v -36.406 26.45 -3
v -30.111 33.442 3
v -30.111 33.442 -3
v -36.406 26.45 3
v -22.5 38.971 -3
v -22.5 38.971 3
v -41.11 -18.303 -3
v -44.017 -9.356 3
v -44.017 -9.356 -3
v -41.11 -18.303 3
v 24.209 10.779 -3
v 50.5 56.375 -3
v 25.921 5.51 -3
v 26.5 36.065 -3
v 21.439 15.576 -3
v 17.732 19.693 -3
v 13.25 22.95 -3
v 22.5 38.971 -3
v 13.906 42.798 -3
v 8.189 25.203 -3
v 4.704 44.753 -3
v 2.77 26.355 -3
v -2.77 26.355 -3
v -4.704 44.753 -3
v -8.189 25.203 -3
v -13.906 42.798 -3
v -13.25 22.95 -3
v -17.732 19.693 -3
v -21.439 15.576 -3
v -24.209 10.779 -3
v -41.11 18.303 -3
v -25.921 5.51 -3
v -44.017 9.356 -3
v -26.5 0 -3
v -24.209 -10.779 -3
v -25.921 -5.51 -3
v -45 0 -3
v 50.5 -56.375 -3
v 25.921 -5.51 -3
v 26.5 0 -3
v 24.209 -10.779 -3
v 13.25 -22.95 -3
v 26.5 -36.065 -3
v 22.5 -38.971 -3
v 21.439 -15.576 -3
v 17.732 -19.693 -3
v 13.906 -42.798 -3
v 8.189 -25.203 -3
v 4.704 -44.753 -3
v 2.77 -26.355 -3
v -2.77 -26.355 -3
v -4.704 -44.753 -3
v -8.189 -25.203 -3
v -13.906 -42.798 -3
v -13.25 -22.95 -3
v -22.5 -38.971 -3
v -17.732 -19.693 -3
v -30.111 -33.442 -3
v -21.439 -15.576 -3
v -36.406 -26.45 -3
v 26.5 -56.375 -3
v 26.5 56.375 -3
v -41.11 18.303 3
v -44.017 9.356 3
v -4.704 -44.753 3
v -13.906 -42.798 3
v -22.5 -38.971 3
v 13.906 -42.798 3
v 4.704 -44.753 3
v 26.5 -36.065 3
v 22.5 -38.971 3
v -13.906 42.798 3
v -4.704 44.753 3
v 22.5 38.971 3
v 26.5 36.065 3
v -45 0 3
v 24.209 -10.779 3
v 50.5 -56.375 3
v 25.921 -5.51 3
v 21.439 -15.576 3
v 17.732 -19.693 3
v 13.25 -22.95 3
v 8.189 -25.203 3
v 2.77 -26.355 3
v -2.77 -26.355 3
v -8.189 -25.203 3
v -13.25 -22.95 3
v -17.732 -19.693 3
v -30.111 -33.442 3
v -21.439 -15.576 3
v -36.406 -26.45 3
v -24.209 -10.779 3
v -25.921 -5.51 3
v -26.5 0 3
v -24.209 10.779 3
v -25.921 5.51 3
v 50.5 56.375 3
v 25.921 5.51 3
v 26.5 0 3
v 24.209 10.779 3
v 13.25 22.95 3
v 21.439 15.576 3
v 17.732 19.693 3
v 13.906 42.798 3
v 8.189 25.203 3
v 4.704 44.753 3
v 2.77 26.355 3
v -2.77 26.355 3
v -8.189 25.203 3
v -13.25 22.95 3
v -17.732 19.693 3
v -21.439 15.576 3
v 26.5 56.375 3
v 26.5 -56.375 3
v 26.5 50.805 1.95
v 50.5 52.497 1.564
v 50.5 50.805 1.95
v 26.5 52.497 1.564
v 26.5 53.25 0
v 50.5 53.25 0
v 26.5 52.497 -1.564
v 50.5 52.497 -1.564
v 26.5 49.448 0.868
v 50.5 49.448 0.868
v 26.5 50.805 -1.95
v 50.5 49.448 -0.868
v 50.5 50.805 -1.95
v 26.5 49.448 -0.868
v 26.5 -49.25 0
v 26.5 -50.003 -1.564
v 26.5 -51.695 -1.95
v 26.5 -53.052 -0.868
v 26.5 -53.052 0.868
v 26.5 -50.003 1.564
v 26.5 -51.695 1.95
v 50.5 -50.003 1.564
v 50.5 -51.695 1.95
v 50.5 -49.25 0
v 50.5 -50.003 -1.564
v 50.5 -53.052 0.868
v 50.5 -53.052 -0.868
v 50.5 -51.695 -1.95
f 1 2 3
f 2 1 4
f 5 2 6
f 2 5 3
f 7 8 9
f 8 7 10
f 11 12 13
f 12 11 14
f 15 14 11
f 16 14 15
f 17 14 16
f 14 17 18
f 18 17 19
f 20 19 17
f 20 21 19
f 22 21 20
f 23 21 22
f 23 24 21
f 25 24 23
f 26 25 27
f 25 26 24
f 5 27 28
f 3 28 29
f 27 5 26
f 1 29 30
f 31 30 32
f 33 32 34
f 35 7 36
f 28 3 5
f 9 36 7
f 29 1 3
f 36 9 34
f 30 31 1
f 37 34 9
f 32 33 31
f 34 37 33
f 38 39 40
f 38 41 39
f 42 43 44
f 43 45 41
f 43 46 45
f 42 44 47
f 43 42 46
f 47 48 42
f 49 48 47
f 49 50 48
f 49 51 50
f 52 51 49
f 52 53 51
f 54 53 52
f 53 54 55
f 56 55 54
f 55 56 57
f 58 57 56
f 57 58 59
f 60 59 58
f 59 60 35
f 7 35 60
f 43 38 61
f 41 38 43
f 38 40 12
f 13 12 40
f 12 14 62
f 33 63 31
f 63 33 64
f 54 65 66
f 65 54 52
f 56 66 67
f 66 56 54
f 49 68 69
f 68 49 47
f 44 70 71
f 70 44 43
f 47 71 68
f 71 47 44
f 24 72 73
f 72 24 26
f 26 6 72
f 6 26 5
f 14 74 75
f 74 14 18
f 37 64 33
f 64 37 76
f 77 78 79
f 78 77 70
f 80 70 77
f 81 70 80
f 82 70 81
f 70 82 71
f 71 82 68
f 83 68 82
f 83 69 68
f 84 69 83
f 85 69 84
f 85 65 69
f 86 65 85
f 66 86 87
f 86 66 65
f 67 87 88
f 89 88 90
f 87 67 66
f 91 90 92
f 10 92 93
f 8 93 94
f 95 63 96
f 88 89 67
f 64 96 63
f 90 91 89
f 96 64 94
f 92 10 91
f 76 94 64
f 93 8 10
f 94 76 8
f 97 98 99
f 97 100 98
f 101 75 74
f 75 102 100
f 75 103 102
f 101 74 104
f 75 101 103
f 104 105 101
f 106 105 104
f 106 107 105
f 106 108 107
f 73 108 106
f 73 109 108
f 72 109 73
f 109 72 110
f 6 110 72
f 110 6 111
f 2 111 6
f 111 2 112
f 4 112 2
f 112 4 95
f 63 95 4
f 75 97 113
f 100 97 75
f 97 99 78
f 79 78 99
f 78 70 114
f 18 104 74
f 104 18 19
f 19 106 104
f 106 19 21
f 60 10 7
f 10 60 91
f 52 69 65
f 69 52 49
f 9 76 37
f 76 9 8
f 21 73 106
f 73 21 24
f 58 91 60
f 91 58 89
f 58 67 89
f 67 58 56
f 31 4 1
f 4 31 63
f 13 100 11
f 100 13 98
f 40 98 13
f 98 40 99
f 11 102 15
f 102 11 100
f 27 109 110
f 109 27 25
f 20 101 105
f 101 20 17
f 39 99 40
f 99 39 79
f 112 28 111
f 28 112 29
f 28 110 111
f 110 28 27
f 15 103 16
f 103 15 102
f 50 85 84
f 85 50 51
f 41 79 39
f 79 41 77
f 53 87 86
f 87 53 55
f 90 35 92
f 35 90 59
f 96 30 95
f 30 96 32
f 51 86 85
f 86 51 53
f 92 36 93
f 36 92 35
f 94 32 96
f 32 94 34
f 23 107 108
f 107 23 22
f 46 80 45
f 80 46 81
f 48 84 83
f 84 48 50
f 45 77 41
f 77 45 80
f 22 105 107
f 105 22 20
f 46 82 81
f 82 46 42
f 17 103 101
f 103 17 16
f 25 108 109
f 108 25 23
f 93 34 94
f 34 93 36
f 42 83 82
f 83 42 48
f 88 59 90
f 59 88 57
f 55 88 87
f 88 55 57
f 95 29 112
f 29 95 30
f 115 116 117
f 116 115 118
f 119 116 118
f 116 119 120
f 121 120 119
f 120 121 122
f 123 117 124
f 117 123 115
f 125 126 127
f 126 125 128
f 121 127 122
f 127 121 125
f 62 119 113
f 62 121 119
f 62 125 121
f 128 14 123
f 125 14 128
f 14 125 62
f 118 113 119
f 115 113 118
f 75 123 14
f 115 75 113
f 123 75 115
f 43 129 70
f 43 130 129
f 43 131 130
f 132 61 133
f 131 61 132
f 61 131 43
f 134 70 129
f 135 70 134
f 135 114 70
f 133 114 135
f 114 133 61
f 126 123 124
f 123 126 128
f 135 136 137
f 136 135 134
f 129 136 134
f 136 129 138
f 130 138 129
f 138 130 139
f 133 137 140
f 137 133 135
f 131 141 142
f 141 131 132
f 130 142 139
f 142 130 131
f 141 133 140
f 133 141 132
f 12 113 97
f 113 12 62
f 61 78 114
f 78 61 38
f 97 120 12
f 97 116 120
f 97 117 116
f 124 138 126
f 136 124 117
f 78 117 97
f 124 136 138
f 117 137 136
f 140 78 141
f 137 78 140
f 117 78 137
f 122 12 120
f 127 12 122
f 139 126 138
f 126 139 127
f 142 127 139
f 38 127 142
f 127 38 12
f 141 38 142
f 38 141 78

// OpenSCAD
// base params
mounting_hole_spacing = 102.5;
mounting_hole_radius = 2;

// dependent params: copied from tower grommet dimensions. sync manually
passthrough_height = 89;
passthrough_radius_outer = 25.5;
wall_thickness = 2.5;
flare_radius = 12.5;
flare_thickness = 3;
fit_gap = 1;
passthrough_radius_inner = passthrough_radius_outer - wall_thickness - fit_gap/2;

// computed params
bracket_width = mounting_hole_spacing * 1.1;
slip_ring_thickness = flare_thickness * 2;
bracket_depth = slip_ring_thickness;
bracket_height = bracket_depth * 4;
slip_ring_radius_outer = passthrough_radius_inner - wall_thickness + flare_radius*2;
slip_ring_radius_inner = passthrough_radius_outer + fit_gap;

// slip ring
translate([0,0,0]) {
    difference() {
        //
        // main flare
        cylinder(
            h = slip_ring_thickness,
            r1 = slip_ring_radius_outer,
            r2 = slip_ring_radius_outer,
            center = true);
        //
        // void
        cylinder(
            h = passthrough_height + 1,
            r1 = slip_ring_radius_inner,
            r2 = slip_ring_radius_inner,
            center = true);
    }  
}

// mounting bracket
translate([slip_ring_radius_inner,bracket_width/2,-bracket_depth/2]) {
    rotate(
    a = [90,0,0]) {
        difference() {
            // bracket bar
            linear_extrude(bracket_width) {
                square([bracket_height, bracket_depth], [0,0]);
            }
            // through-holes
            rotate(
            a = [0,90,0]) {
                translate([-(bracket_width-mounting_hole_spacing)/2,bracket_depth/2,0]) {
                cylinder(
                    h = bracket_height*1.1,
                    r1 = mounting_hole_radius,
                    r2 = mounting_hole_radius);
                }
                translate([-(bracket_width+mounting_hole_spacing)/2,bracket_depth/2,0]) {
                cylinder(
                    h = bracket_height*1.1,
                    r1 = mounting_hole_radius,
                    r2 = mounting_hole_radius);
                }
            }
        }
    }     
}
